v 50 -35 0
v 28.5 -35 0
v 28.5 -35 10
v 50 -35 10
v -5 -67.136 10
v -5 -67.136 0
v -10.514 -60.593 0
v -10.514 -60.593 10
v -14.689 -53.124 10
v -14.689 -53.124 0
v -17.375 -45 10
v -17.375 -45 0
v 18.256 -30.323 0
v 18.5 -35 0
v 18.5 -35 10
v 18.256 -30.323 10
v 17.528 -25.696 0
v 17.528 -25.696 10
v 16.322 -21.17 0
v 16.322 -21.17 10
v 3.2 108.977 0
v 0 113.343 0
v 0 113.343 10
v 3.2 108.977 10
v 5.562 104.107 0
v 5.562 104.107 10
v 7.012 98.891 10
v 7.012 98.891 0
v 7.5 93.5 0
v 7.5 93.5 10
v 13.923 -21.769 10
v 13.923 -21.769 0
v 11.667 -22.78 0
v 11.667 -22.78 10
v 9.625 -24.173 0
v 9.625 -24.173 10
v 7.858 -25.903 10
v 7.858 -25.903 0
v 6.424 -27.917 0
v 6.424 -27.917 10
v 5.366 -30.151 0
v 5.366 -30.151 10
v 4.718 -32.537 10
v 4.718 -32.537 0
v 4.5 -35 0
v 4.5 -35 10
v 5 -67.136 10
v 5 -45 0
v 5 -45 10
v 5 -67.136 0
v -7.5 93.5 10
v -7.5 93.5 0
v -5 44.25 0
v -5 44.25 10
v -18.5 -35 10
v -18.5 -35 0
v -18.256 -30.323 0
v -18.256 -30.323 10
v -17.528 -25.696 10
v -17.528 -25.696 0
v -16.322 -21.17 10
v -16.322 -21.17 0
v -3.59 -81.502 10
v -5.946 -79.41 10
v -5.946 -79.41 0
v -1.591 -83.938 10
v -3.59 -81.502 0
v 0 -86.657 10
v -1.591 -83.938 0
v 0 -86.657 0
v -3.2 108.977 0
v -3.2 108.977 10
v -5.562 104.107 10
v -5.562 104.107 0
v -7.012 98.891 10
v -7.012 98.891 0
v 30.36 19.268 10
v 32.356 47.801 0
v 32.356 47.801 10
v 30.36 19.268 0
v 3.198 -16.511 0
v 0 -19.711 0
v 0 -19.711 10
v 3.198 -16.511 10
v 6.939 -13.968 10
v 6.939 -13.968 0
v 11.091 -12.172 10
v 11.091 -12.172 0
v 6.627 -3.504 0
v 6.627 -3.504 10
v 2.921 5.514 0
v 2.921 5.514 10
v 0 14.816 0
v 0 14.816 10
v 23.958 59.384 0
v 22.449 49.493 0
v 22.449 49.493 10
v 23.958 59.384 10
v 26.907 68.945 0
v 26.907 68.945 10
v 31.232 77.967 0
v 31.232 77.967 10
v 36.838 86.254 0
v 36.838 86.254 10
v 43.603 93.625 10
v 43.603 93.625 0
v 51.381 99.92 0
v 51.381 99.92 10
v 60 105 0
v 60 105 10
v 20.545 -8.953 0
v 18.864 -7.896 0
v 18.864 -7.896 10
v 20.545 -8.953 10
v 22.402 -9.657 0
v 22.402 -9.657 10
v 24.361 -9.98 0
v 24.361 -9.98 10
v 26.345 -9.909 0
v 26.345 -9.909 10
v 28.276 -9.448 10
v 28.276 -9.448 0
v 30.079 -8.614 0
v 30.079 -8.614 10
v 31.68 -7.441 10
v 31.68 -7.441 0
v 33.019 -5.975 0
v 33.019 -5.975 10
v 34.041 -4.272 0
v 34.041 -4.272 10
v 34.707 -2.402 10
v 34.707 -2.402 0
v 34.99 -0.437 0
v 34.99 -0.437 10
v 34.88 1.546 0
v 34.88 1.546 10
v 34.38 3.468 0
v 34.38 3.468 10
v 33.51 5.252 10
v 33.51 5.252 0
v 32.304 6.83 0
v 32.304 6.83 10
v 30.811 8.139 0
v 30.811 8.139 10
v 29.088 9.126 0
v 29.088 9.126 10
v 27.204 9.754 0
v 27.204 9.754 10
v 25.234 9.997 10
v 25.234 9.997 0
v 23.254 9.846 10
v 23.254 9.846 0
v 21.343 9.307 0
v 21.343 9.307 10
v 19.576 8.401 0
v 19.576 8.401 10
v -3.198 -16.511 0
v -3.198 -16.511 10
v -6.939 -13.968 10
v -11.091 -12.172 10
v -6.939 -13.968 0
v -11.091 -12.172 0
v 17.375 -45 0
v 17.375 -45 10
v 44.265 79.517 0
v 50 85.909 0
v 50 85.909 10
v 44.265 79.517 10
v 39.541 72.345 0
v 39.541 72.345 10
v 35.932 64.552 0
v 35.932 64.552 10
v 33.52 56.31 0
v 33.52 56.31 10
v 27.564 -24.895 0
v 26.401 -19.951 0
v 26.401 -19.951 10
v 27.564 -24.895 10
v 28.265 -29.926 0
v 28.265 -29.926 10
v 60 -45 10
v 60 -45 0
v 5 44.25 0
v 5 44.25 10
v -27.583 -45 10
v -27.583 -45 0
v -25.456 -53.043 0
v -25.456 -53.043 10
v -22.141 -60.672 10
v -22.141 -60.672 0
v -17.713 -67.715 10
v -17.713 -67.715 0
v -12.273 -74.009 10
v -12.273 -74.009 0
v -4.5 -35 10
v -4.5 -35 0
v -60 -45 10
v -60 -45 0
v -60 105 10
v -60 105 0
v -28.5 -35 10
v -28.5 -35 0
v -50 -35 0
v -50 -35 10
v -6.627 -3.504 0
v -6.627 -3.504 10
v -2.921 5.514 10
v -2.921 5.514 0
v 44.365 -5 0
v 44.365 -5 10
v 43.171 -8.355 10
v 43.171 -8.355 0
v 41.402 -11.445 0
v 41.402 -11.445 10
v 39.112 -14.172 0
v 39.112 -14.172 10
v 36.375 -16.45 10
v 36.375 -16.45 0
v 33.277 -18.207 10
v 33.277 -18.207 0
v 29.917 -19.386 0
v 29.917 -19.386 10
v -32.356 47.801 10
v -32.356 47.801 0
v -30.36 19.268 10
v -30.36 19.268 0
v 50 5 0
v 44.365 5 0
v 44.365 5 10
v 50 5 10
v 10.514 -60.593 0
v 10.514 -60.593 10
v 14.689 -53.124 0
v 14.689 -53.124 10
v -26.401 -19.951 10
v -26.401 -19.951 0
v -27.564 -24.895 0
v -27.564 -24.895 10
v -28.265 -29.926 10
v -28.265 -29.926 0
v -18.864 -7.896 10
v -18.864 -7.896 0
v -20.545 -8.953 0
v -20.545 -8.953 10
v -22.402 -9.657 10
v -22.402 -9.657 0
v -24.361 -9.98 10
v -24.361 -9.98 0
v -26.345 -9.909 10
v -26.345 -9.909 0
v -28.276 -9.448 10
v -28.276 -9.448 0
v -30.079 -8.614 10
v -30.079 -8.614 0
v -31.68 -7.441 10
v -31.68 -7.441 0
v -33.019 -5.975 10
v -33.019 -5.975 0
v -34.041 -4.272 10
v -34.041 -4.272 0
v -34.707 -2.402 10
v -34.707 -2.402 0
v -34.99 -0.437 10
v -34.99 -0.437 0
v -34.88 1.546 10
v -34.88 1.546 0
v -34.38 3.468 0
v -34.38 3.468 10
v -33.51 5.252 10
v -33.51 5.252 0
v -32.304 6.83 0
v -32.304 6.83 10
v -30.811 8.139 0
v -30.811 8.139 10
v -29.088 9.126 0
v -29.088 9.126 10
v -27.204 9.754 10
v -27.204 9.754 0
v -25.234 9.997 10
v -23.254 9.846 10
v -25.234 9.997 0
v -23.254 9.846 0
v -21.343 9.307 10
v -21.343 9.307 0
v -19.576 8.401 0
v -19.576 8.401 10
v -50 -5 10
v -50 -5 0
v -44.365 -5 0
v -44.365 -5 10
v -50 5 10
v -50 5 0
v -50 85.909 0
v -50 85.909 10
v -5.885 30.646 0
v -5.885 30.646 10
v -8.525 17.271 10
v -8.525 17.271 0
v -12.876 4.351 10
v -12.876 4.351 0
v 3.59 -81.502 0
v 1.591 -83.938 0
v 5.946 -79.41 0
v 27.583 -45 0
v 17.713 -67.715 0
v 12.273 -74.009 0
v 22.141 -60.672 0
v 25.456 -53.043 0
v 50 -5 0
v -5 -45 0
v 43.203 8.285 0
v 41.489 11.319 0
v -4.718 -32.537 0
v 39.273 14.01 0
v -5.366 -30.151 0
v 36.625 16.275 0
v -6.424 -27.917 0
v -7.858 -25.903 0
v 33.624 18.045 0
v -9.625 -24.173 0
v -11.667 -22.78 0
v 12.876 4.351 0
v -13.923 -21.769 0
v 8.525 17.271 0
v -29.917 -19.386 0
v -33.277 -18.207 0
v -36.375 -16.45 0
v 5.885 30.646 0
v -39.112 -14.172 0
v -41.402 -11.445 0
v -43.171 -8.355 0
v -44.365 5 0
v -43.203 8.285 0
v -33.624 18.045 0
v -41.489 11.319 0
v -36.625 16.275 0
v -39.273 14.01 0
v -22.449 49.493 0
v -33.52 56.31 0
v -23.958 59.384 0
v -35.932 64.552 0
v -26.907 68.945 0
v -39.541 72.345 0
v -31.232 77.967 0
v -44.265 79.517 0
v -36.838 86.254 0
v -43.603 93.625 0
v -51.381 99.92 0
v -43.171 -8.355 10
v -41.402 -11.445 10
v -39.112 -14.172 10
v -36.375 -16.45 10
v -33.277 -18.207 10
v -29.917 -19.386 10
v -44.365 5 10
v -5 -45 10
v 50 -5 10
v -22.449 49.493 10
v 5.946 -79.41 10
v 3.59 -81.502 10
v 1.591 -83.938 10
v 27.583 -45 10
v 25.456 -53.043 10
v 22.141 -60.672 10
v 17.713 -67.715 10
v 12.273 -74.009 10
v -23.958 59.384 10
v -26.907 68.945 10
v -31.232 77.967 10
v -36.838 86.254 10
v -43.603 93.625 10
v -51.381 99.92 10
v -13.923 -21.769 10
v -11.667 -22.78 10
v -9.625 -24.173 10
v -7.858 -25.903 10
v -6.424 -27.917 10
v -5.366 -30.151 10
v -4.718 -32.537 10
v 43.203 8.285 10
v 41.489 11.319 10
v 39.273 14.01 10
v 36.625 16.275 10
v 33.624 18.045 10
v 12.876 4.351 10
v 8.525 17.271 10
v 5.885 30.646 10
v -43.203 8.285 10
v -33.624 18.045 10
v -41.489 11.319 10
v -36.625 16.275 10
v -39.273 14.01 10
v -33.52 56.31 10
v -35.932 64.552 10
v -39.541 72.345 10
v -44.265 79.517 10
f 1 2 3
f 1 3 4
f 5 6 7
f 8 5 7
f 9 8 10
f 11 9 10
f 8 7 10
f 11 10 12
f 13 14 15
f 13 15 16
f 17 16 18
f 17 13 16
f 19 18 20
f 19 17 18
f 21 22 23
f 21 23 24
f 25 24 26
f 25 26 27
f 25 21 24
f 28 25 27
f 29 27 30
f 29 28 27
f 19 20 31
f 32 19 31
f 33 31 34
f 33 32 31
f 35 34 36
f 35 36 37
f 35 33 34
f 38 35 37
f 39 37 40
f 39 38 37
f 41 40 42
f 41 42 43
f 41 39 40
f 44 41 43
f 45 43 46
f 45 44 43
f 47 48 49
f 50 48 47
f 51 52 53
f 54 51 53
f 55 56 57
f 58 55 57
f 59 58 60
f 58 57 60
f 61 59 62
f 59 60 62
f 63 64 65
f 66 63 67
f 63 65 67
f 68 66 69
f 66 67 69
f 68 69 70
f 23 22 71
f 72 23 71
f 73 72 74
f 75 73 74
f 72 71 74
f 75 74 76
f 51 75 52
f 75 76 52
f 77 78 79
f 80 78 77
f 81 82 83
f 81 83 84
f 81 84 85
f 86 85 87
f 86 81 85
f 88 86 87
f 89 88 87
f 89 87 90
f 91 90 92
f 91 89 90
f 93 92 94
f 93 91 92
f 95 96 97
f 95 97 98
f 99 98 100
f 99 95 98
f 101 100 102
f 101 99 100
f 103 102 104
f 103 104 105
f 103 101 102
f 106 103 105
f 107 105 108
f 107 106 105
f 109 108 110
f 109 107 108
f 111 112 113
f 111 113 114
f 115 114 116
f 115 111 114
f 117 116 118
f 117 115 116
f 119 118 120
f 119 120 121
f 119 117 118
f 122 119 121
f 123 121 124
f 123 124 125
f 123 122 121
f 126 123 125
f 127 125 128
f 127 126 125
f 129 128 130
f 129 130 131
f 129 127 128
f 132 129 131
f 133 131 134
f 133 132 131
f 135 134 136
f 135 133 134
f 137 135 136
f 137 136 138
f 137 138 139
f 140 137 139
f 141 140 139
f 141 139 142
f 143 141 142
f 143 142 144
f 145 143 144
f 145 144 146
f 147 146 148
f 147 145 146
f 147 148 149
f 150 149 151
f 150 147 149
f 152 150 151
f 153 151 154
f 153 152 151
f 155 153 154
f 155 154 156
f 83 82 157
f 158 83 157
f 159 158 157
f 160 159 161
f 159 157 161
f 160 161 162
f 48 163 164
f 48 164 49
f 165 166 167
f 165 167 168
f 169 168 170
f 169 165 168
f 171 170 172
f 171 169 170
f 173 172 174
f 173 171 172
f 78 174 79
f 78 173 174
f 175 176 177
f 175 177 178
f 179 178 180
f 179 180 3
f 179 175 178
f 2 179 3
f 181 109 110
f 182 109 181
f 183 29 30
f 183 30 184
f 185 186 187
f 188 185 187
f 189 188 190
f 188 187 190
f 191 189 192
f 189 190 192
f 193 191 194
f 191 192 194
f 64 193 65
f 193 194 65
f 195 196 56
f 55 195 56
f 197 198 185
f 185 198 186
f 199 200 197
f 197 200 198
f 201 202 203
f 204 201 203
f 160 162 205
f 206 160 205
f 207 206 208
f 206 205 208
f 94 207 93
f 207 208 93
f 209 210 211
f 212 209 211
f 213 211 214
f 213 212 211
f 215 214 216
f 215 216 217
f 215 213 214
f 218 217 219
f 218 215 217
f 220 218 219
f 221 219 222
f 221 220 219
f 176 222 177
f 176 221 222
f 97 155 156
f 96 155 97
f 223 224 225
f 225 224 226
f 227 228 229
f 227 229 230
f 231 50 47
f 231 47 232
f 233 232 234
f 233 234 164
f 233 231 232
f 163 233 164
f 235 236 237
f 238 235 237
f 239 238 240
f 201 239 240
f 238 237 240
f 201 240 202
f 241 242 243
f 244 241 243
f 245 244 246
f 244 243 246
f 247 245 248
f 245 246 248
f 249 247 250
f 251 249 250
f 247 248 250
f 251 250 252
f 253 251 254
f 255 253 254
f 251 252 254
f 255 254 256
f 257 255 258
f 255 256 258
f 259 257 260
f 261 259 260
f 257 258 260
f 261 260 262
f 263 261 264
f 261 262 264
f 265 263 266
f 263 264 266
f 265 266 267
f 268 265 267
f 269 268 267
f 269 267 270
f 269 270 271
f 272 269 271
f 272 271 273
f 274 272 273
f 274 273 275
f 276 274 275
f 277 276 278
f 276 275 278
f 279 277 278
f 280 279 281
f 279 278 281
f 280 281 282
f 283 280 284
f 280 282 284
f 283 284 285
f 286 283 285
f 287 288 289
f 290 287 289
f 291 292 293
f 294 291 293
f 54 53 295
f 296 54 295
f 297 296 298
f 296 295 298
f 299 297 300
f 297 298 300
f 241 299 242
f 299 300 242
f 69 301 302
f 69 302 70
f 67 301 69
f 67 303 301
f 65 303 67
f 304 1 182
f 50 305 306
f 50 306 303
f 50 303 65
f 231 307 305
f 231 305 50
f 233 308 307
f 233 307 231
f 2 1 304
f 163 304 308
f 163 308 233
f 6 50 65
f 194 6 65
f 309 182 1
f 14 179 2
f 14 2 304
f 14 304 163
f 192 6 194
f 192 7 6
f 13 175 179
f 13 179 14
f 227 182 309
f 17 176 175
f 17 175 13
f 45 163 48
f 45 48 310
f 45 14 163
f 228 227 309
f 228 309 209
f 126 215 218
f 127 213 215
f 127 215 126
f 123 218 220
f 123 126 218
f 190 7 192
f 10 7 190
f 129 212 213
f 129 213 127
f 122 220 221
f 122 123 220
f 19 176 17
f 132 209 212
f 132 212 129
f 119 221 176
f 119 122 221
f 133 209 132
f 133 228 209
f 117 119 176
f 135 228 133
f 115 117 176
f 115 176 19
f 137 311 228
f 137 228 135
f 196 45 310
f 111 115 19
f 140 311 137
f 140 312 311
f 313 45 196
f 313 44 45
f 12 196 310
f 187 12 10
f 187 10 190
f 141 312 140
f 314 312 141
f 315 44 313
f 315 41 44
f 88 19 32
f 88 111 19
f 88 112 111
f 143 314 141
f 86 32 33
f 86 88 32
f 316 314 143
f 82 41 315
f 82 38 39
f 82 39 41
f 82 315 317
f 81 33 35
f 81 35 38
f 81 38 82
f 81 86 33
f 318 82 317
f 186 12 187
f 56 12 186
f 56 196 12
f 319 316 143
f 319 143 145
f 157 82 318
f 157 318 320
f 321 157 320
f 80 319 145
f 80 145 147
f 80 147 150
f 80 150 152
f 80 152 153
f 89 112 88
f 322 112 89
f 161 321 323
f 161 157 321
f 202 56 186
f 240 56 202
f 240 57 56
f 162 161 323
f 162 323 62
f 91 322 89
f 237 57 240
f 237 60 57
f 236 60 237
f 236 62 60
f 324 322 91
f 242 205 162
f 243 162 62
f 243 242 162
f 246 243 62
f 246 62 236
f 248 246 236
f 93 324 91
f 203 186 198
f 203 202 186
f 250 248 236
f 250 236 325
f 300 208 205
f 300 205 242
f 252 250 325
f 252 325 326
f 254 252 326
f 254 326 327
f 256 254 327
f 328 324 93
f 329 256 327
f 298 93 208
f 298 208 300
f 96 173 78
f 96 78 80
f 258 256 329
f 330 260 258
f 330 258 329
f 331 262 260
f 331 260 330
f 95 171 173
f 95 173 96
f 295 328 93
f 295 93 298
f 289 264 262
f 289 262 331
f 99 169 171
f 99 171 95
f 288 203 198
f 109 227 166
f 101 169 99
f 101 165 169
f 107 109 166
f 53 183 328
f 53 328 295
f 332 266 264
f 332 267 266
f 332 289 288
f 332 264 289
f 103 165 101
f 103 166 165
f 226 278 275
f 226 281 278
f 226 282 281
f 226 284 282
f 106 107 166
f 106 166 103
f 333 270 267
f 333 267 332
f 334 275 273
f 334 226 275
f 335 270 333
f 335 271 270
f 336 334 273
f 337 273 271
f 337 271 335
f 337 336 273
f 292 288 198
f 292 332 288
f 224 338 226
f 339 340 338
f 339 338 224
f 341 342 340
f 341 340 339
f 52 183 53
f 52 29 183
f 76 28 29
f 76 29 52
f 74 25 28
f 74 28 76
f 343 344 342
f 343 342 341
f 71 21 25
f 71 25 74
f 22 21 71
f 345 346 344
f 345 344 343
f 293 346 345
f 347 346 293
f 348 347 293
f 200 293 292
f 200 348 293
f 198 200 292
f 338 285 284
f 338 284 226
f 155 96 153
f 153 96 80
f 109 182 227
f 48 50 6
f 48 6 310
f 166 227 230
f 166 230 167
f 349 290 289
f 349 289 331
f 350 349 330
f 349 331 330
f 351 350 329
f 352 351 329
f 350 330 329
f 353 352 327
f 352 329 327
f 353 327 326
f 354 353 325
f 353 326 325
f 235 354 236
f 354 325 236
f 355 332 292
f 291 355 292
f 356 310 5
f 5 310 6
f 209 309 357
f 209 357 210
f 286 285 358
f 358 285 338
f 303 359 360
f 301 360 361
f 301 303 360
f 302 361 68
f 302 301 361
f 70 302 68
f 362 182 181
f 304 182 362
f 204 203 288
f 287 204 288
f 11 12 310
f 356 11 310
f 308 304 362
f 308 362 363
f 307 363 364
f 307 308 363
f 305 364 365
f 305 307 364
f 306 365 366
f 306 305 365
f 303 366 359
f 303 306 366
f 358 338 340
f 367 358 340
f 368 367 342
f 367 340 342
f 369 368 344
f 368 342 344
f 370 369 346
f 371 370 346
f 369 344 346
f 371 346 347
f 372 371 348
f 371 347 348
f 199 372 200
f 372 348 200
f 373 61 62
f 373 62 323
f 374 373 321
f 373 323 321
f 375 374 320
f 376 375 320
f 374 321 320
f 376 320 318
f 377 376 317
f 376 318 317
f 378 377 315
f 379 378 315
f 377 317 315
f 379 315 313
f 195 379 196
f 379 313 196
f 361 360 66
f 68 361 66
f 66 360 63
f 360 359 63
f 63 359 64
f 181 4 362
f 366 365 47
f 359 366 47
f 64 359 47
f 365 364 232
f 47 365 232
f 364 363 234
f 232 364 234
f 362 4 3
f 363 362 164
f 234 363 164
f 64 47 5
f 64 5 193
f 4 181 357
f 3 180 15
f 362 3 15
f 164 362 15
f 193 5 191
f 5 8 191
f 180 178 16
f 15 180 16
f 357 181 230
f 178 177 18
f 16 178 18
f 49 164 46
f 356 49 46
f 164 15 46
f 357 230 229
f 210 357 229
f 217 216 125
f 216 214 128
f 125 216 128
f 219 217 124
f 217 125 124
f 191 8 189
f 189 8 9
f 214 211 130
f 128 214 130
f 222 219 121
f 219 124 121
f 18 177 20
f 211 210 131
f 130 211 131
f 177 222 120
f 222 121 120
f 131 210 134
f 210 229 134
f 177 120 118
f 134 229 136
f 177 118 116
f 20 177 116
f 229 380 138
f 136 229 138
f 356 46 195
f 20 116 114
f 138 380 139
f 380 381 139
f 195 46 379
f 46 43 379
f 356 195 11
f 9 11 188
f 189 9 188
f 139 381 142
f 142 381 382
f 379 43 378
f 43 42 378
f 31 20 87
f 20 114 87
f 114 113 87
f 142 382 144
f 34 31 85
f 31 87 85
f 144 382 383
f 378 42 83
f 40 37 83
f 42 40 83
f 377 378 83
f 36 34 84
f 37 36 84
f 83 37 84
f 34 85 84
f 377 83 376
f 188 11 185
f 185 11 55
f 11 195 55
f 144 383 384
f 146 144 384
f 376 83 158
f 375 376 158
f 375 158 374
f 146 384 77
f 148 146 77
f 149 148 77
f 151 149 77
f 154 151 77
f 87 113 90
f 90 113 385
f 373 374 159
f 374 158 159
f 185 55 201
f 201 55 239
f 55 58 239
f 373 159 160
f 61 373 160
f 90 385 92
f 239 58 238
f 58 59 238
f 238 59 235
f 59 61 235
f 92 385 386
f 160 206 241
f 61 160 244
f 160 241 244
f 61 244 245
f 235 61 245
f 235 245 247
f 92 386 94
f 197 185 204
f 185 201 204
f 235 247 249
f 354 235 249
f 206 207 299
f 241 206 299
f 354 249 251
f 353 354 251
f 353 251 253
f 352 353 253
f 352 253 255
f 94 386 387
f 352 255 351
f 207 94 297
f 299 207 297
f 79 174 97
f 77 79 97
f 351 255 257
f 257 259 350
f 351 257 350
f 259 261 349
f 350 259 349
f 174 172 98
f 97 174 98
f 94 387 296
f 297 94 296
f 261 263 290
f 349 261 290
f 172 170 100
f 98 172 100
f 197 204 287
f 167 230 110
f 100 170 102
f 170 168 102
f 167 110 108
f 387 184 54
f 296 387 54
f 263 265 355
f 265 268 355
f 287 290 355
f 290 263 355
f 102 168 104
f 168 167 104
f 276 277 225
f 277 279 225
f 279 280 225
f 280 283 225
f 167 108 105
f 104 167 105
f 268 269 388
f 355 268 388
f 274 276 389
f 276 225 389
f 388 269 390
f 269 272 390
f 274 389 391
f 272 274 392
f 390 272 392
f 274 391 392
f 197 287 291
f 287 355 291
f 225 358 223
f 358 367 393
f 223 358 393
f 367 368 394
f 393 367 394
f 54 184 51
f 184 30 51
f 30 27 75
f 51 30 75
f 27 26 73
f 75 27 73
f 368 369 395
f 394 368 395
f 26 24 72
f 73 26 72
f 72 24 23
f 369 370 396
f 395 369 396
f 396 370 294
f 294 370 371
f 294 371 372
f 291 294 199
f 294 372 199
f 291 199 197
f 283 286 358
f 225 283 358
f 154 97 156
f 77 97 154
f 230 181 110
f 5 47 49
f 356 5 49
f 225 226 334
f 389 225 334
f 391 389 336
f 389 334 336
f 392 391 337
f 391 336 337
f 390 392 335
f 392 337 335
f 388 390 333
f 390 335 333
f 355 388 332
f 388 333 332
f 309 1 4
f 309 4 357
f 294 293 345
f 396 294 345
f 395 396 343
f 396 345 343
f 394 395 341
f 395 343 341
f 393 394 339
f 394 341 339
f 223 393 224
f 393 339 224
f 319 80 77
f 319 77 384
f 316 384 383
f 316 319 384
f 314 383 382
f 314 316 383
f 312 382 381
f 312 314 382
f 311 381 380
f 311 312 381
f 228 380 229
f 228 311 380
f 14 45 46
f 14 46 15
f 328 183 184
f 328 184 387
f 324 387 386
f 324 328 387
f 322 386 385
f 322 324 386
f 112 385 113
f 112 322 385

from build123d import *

# Parameters (mm, degrees)
EXTRUDE_1_DEPTH = 10


with BuildPart() as part:
    # Эскиз1 → Бобышка-Вытянуть1 (new body)
    with BuildSketch(Plane.XY):
        with BuildLine():
            Line((-60, -45), (-27.583269132, -45))
            ThreePointArc((-27.583269132, -45), (-20.06001769, -64.277376125), (-5.945767968, -79.41027067))
            ThreePointArc((-5.945767968, -79.41027067), (-2.542345747, -82.680315027), (0, -86.656865167))
            Line((0, -86.656865167), (0, -19.711115149))
            ThreePointArc((0, -19.711115149), (-5.008387109, -15.151161707), (-11.091351129, -12.172124017))
            ThreePointArc((-11.091351129, -12.172124017), (-4.677676581, 0.965070873), (0, 14.815718966))
            Line((0, 14.815718966), (0, 113.343134833))
            ThreePointArc((0, 113.343134833), (-5.562430401, 104.106601718), (-7.5, 93.5))
            Line((-7.5, 93.5), (-5, 44.25))
            ThreePointArc((-5, 44.25), (-8.525159088, 17.271181236), (-18.863936417, -7.896120801))
            ThreePointArc((-18.863936417, -7.896120801), (-34.990467135, -0.436539144), (-19.576058944, 8.401241779))
            Line((-19.576058944, 8.401241779), (-22.449472465, 49.49296956))
            ThreePointArc((-22.449472465, 49.49296956), (-33.881518529, 82.214174393), (-60, 105))
            Line((-60, 105), (-60, -45))
        make_face()
        with BuildLine():
            ThreePointArc((-26.401072965, -19.950864506), (-27.972740949, -27.40259956), (-28.5, -35))
            Line((-28.5, -35), (-50, -35))
            Line((-50, -35), (-50, -5))
            Line((-50, -5), (-44.364916731, -5))
            ThreePointArc((-44.364916731, -5), (-37.794087282, -15.372421104), (-26.401072965, -19.950864506))
        make_face(mode=Mode.SUBTRACT)
        with BuildLine():
            Line((-5, -45), (-5, -67.136427928))
            ThreePointArc((-5, -67.136427928), (-12.779082294, -56.957998409), (-17.374821937, -45))
            Line((-17.374821937, -45), (-5, -45))
        make_face(mode=Mode.SUBTRACT)
        with BuildLine():
            Line((-4.5, -35), (-18.5, -35))
            ThreePointArc((-18.5, -35), (-17.952221542, -28), (-16.322222222, -21.170419965))
            ThreePointArc((-16.322222222, -21.170419965), (-7.858362699, -25.902991945), (-4.5, -35))
        make_face(mode=Mode.SUBTRACT)
        with BuildLine():
            Line((-44.364916731, 5), (-50, 5))
            Line((-50, 5), (-50, 85.909197079))
            ThreePointArc((-50, 85.909197079), (-37.591425702, 68.515820434), (-32.355603325, 47.801370616))
            Line((-32.355603325, 47.801370616), (-30.360374841, 19.268273964))
            ThreePointArc((-30.360374841, 19.268273964), (-39.273434111, 14.009606657), (-44.364916731, 5))
        make_face(mode=Mode.SUBTRACT)
    extrude_1 = extrude(amount=EXTRUDE_1_DEPTH)

    # Зеркальное отражение1: Бобышка-Вытянуть1 across plane
    add(extrude_1.mirror(Plane(origin=(0, 0, 0), x_dir=(0, 0, 1), z_dir=(1, 0, 0))))


solid = part.part
